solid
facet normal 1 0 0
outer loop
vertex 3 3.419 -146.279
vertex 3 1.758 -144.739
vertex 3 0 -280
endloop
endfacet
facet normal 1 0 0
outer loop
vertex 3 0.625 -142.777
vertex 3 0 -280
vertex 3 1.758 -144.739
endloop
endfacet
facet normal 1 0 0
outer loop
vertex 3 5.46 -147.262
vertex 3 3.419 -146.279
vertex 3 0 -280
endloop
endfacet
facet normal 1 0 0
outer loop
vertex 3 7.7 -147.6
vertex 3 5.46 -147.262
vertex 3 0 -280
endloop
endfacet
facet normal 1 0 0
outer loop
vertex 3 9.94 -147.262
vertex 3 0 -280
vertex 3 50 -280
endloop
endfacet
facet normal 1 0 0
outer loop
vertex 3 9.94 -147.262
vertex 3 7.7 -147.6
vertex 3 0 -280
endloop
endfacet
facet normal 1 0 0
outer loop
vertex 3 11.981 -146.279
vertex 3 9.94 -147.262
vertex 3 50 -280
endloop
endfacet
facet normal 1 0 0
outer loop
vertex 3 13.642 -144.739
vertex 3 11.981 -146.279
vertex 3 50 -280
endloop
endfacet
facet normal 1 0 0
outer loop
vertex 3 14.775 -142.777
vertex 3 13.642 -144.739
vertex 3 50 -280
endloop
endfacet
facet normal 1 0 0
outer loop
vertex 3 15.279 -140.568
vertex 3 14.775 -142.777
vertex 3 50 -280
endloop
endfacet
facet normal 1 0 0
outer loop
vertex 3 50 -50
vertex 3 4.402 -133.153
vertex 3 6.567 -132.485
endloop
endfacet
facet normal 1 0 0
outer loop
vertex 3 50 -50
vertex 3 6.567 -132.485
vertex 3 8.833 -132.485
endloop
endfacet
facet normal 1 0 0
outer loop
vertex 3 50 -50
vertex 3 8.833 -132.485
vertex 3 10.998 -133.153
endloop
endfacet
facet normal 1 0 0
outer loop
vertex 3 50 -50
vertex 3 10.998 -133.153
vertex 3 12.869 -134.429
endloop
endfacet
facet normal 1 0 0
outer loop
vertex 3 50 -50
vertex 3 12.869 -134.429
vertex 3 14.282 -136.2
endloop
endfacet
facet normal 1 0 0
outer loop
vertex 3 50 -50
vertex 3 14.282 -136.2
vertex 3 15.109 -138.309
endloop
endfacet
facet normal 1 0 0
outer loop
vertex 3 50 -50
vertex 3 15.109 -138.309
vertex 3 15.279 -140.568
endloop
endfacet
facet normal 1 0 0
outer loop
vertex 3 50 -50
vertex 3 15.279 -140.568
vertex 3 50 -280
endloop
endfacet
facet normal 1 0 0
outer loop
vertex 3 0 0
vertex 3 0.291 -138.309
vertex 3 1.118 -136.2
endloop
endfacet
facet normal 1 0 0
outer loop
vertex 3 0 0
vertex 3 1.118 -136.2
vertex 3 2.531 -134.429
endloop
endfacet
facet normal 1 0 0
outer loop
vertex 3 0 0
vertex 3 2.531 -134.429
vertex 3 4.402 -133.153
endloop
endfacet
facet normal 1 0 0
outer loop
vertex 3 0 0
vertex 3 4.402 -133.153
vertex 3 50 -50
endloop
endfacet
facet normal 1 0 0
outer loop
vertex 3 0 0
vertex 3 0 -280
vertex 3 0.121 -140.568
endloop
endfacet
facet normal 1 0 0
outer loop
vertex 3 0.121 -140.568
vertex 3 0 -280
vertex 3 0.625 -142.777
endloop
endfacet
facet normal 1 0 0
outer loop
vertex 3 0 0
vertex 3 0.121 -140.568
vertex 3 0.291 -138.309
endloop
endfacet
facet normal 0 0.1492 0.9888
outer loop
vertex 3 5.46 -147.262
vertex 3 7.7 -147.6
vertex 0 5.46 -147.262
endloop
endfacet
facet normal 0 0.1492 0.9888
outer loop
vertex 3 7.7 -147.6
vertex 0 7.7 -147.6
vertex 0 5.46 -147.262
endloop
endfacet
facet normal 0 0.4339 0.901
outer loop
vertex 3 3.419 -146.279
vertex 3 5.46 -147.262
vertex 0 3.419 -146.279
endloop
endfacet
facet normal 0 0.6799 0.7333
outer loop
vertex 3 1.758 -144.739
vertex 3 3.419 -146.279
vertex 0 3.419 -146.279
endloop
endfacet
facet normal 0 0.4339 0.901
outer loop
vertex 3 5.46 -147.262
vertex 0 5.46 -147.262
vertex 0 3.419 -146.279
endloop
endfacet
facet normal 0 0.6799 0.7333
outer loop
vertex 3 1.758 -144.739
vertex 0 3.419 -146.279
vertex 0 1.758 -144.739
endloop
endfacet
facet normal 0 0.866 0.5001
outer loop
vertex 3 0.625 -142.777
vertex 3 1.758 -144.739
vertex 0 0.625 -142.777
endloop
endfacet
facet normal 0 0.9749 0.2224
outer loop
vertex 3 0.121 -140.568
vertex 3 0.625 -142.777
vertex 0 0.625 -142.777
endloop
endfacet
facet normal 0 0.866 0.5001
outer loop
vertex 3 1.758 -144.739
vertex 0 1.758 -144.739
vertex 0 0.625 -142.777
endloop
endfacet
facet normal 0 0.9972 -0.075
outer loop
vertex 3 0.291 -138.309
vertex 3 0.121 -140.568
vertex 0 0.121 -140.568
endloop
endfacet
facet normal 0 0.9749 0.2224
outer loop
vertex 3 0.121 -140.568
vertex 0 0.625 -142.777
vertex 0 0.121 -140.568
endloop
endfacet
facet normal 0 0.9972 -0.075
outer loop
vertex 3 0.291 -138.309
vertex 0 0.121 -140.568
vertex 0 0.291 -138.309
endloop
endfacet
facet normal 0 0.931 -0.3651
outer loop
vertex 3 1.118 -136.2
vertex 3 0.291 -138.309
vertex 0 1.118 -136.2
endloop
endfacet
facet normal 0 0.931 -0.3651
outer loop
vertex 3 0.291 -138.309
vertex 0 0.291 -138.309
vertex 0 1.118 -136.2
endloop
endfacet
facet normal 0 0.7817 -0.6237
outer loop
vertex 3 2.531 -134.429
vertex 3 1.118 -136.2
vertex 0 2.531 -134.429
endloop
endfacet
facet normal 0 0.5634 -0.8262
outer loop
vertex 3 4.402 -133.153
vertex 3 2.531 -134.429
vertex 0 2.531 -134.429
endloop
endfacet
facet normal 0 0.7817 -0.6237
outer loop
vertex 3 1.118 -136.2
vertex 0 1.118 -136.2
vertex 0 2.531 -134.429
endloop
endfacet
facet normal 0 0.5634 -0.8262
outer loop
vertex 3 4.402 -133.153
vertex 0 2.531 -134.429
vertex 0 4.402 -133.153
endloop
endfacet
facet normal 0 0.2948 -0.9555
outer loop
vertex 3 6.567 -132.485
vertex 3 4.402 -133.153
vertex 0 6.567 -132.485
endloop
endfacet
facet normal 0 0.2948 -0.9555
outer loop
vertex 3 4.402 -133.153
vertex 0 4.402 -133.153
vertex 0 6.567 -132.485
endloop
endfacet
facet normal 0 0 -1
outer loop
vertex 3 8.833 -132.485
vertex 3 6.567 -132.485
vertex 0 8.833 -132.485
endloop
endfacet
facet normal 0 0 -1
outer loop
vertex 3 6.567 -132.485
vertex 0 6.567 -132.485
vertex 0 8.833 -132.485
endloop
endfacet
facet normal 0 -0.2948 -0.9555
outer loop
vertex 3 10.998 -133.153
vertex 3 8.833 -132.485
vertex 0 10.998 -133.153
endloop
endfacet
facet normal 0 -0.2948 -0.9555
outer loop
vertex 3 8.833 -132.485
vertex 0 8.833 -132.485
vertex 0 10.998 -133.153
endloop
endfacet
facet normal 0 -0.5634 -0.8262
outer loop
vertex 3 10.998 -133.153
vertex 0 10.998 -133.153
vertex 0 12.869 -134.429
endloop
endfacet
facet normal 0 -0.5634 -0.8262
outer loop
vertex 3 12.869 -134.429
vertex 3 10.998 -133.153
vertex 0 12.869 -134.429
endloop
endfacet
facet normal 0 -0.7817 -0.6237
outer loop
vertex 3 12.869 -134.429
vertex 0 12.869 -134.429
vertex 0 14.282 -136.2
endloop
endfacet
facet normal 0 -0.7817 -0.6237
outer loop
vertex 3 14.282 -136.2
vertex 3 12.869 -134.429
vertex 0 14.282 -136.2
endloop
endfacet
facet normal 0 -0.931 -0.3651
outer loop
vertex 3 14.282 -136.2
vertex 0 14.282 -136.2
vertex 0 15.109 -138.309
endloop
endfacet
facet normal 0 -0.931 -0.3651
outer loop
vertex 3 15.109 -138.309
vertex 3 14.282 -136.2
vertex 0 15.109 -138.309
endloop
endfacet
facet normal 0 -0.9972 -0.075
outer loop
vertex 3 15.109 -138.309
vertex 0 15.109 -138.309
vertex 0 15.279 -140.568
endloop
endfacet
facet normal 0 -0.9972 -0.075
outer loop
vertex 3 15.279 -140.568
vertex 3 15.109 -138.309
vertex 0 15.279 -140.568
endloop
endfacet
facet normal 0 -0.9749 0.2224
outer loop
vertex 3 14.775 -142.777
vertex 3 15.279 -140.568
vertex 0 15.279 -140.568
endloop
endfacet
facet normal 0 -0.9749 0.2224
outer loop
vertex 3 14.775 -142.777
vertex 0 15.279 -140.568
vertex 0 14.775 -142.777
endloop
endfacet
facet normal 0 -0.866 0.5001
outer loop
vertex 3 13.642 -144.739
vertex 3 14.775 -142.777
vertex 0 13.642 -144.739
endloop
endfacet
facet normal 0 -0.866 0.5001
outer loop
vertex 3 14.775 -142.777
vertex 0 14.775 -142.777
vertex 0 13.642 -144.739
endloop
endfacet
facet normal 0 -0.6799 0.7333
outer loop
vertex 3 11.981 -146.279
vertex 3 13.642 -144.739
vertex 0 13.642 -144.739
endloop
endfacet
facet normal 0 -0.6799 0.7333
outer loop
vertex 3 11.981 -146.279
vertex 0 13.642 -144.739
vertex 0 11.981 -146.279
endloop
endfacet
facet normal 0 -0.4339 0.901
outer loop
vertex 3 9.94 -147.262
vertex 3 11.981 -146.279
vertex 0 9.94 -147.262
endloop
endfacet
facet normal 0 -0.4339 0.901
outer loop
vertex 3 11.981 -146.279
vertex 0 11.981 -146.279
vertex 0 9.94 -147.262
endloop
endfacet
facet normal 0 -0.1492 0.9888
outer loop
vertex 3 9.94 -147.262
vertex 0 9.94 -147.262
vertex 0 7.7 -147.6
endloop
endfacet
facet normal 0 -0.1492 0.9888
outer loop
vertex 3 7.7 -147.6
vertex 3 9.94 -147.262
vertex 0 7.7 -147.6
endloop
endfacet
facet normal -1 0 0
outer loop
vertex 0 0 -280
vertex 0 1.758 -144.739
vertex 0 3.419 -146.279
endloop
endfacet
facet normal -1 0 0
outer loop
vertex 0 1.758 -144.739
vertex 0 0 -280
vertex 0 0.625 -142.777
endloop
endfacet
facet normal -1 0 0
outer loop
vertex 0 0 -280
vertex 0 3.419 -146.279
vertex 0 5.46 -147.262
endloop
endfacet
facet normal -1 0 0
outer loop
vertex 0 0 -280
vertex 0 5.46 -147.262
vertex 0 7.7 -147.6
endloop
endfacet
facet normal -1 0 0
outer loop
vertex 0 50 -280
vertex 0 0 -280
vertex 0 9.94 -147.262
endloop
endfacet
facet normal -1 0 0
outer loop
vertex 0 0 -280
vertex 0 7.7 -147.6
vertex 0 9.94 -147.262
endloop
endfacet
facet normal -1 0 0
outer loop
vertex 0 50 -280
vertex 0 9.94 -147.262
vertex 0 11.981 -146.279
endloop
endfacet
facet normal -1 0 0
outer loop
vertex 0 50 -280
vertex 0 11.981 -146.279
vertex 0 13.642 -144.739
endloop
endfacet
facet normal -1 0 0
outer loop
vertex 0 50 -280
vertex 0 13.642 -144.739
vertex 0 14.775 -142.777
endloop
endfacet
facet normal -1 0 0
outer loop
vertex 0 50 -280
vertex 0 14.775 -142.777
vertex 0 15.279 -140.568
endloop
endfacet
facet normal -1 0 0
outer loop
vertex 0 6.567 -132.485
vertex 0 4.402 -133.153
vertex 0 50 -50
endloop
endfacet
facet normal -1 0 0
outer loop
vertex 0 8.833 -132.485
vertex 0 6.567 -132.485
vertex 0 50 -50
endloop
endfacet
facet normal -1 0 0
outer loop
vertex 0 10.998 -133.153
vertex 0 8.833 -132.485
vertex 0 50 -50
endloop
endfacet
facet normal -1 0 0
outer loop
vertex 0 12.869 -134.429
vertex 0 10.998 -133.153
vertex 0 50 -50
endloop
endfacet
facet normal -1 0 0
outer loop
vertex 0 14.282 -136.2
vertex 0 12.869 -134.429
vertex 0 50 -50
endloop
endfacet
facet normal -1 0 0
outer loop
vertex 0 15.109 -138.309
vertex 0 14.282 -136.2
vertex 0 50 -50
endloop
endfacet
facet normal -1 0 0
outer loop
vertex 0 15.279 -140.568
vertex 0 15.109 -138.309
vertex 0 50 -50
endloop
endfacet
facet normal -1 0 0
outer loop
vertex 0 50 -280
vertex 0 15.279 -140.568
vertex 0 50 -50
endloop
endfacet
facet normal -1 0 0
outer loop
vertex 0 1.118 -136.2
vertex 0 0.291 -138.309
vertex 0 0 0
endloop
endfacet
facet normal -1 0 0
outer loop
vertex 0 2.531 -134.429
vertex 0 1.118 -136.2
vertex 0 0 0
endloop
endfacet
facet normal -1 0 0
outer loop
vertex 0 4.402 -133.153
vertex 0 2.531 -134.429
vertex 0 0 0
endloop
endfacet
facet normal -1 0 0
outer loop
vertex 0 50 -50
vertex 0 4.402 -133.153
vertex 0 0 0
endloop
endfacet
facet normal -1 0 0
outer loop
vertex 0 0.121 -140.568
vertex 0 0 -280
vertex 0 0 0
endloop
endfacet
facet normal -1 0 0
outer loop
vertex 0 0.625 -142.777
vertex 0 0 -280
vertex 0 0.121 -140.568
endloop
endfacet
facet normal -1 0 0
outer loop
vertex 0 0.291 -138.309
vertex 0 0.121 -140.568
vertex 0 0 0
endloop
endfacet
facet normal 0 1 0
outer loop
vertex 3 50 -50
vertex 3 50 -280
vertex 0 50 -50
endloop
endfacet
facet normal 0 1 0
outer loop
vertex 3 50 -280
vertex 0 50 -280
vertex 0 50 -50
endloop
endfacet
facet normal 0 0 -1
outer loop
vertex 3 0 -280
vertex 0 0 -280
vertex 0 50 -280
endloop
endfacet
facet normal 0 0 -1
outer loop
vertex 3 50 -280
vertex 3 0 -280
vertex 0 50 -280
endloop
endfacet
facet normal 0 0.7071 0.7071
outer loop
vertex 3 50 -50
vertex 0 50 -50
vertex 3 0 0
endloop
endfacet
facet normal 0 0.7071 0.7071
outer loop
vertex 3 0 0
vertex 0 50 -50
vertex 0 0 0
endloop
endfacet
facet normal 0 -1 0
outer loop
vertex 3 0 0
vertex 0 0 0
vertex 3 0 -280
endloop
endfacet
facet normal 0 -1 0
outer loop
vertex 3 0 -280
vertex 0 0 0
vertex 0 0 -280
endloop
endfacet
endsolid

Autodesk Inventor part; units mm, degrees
ref_plane "YZ Plane" through (0, 0, 0) normal (1, 0, 0) x (0, 1, 0)
ref_plane "XZ Plane" through (0, 0, 0) normal (0, 1, 0) x (-1, 0, 0)
ref_plane "XY Plane" through (0, 0, 0) normal (0, 0, 1) x (1, 0, 0)
sketch "Sketch1" plane through (0, 0, 0) normal (1, 0, 0) x (0, 1, 0)
  line L0 (0, 0) -> (0, -280)
  line L1 (0, -280) -> (50, -280)
  line L2 (50, -280) -> (50, -50)
  line L3 (0, 0) -> (0, 0)
  line L4 (50, -50) -> (0, 0)
  dimension "d0" = 280
  dimension "d1" = 50
  dimension "d2" = 90
extrude "Extrusion1" add sketch "Sketch1" along normal blind 3
sketch "Sketch2" plane through (3, 0, 0) normal (1, 0, 0) x (0, 0, -1)
  line L0 (280, 0) -> (280, 50) projected
  line L1 (280, 50) -> (50, 50) projected
  line L2 (280, 50) -> (140, 50)
  line L3 (140, 50) -> (140, 7.7)
  point P0 (0, 0)
  dimension "d6" = 140
  dimension "d7" = 42.3
hole "Hole1" at (3, 7.7, -140) direction (-1, 0, 0) diameter 15.2 end through all
sketch "Sketch3" plane through (3, 0, 0) normal (1, 0, 0) x (0, 0, -1)
  point P0 (0, 0)
